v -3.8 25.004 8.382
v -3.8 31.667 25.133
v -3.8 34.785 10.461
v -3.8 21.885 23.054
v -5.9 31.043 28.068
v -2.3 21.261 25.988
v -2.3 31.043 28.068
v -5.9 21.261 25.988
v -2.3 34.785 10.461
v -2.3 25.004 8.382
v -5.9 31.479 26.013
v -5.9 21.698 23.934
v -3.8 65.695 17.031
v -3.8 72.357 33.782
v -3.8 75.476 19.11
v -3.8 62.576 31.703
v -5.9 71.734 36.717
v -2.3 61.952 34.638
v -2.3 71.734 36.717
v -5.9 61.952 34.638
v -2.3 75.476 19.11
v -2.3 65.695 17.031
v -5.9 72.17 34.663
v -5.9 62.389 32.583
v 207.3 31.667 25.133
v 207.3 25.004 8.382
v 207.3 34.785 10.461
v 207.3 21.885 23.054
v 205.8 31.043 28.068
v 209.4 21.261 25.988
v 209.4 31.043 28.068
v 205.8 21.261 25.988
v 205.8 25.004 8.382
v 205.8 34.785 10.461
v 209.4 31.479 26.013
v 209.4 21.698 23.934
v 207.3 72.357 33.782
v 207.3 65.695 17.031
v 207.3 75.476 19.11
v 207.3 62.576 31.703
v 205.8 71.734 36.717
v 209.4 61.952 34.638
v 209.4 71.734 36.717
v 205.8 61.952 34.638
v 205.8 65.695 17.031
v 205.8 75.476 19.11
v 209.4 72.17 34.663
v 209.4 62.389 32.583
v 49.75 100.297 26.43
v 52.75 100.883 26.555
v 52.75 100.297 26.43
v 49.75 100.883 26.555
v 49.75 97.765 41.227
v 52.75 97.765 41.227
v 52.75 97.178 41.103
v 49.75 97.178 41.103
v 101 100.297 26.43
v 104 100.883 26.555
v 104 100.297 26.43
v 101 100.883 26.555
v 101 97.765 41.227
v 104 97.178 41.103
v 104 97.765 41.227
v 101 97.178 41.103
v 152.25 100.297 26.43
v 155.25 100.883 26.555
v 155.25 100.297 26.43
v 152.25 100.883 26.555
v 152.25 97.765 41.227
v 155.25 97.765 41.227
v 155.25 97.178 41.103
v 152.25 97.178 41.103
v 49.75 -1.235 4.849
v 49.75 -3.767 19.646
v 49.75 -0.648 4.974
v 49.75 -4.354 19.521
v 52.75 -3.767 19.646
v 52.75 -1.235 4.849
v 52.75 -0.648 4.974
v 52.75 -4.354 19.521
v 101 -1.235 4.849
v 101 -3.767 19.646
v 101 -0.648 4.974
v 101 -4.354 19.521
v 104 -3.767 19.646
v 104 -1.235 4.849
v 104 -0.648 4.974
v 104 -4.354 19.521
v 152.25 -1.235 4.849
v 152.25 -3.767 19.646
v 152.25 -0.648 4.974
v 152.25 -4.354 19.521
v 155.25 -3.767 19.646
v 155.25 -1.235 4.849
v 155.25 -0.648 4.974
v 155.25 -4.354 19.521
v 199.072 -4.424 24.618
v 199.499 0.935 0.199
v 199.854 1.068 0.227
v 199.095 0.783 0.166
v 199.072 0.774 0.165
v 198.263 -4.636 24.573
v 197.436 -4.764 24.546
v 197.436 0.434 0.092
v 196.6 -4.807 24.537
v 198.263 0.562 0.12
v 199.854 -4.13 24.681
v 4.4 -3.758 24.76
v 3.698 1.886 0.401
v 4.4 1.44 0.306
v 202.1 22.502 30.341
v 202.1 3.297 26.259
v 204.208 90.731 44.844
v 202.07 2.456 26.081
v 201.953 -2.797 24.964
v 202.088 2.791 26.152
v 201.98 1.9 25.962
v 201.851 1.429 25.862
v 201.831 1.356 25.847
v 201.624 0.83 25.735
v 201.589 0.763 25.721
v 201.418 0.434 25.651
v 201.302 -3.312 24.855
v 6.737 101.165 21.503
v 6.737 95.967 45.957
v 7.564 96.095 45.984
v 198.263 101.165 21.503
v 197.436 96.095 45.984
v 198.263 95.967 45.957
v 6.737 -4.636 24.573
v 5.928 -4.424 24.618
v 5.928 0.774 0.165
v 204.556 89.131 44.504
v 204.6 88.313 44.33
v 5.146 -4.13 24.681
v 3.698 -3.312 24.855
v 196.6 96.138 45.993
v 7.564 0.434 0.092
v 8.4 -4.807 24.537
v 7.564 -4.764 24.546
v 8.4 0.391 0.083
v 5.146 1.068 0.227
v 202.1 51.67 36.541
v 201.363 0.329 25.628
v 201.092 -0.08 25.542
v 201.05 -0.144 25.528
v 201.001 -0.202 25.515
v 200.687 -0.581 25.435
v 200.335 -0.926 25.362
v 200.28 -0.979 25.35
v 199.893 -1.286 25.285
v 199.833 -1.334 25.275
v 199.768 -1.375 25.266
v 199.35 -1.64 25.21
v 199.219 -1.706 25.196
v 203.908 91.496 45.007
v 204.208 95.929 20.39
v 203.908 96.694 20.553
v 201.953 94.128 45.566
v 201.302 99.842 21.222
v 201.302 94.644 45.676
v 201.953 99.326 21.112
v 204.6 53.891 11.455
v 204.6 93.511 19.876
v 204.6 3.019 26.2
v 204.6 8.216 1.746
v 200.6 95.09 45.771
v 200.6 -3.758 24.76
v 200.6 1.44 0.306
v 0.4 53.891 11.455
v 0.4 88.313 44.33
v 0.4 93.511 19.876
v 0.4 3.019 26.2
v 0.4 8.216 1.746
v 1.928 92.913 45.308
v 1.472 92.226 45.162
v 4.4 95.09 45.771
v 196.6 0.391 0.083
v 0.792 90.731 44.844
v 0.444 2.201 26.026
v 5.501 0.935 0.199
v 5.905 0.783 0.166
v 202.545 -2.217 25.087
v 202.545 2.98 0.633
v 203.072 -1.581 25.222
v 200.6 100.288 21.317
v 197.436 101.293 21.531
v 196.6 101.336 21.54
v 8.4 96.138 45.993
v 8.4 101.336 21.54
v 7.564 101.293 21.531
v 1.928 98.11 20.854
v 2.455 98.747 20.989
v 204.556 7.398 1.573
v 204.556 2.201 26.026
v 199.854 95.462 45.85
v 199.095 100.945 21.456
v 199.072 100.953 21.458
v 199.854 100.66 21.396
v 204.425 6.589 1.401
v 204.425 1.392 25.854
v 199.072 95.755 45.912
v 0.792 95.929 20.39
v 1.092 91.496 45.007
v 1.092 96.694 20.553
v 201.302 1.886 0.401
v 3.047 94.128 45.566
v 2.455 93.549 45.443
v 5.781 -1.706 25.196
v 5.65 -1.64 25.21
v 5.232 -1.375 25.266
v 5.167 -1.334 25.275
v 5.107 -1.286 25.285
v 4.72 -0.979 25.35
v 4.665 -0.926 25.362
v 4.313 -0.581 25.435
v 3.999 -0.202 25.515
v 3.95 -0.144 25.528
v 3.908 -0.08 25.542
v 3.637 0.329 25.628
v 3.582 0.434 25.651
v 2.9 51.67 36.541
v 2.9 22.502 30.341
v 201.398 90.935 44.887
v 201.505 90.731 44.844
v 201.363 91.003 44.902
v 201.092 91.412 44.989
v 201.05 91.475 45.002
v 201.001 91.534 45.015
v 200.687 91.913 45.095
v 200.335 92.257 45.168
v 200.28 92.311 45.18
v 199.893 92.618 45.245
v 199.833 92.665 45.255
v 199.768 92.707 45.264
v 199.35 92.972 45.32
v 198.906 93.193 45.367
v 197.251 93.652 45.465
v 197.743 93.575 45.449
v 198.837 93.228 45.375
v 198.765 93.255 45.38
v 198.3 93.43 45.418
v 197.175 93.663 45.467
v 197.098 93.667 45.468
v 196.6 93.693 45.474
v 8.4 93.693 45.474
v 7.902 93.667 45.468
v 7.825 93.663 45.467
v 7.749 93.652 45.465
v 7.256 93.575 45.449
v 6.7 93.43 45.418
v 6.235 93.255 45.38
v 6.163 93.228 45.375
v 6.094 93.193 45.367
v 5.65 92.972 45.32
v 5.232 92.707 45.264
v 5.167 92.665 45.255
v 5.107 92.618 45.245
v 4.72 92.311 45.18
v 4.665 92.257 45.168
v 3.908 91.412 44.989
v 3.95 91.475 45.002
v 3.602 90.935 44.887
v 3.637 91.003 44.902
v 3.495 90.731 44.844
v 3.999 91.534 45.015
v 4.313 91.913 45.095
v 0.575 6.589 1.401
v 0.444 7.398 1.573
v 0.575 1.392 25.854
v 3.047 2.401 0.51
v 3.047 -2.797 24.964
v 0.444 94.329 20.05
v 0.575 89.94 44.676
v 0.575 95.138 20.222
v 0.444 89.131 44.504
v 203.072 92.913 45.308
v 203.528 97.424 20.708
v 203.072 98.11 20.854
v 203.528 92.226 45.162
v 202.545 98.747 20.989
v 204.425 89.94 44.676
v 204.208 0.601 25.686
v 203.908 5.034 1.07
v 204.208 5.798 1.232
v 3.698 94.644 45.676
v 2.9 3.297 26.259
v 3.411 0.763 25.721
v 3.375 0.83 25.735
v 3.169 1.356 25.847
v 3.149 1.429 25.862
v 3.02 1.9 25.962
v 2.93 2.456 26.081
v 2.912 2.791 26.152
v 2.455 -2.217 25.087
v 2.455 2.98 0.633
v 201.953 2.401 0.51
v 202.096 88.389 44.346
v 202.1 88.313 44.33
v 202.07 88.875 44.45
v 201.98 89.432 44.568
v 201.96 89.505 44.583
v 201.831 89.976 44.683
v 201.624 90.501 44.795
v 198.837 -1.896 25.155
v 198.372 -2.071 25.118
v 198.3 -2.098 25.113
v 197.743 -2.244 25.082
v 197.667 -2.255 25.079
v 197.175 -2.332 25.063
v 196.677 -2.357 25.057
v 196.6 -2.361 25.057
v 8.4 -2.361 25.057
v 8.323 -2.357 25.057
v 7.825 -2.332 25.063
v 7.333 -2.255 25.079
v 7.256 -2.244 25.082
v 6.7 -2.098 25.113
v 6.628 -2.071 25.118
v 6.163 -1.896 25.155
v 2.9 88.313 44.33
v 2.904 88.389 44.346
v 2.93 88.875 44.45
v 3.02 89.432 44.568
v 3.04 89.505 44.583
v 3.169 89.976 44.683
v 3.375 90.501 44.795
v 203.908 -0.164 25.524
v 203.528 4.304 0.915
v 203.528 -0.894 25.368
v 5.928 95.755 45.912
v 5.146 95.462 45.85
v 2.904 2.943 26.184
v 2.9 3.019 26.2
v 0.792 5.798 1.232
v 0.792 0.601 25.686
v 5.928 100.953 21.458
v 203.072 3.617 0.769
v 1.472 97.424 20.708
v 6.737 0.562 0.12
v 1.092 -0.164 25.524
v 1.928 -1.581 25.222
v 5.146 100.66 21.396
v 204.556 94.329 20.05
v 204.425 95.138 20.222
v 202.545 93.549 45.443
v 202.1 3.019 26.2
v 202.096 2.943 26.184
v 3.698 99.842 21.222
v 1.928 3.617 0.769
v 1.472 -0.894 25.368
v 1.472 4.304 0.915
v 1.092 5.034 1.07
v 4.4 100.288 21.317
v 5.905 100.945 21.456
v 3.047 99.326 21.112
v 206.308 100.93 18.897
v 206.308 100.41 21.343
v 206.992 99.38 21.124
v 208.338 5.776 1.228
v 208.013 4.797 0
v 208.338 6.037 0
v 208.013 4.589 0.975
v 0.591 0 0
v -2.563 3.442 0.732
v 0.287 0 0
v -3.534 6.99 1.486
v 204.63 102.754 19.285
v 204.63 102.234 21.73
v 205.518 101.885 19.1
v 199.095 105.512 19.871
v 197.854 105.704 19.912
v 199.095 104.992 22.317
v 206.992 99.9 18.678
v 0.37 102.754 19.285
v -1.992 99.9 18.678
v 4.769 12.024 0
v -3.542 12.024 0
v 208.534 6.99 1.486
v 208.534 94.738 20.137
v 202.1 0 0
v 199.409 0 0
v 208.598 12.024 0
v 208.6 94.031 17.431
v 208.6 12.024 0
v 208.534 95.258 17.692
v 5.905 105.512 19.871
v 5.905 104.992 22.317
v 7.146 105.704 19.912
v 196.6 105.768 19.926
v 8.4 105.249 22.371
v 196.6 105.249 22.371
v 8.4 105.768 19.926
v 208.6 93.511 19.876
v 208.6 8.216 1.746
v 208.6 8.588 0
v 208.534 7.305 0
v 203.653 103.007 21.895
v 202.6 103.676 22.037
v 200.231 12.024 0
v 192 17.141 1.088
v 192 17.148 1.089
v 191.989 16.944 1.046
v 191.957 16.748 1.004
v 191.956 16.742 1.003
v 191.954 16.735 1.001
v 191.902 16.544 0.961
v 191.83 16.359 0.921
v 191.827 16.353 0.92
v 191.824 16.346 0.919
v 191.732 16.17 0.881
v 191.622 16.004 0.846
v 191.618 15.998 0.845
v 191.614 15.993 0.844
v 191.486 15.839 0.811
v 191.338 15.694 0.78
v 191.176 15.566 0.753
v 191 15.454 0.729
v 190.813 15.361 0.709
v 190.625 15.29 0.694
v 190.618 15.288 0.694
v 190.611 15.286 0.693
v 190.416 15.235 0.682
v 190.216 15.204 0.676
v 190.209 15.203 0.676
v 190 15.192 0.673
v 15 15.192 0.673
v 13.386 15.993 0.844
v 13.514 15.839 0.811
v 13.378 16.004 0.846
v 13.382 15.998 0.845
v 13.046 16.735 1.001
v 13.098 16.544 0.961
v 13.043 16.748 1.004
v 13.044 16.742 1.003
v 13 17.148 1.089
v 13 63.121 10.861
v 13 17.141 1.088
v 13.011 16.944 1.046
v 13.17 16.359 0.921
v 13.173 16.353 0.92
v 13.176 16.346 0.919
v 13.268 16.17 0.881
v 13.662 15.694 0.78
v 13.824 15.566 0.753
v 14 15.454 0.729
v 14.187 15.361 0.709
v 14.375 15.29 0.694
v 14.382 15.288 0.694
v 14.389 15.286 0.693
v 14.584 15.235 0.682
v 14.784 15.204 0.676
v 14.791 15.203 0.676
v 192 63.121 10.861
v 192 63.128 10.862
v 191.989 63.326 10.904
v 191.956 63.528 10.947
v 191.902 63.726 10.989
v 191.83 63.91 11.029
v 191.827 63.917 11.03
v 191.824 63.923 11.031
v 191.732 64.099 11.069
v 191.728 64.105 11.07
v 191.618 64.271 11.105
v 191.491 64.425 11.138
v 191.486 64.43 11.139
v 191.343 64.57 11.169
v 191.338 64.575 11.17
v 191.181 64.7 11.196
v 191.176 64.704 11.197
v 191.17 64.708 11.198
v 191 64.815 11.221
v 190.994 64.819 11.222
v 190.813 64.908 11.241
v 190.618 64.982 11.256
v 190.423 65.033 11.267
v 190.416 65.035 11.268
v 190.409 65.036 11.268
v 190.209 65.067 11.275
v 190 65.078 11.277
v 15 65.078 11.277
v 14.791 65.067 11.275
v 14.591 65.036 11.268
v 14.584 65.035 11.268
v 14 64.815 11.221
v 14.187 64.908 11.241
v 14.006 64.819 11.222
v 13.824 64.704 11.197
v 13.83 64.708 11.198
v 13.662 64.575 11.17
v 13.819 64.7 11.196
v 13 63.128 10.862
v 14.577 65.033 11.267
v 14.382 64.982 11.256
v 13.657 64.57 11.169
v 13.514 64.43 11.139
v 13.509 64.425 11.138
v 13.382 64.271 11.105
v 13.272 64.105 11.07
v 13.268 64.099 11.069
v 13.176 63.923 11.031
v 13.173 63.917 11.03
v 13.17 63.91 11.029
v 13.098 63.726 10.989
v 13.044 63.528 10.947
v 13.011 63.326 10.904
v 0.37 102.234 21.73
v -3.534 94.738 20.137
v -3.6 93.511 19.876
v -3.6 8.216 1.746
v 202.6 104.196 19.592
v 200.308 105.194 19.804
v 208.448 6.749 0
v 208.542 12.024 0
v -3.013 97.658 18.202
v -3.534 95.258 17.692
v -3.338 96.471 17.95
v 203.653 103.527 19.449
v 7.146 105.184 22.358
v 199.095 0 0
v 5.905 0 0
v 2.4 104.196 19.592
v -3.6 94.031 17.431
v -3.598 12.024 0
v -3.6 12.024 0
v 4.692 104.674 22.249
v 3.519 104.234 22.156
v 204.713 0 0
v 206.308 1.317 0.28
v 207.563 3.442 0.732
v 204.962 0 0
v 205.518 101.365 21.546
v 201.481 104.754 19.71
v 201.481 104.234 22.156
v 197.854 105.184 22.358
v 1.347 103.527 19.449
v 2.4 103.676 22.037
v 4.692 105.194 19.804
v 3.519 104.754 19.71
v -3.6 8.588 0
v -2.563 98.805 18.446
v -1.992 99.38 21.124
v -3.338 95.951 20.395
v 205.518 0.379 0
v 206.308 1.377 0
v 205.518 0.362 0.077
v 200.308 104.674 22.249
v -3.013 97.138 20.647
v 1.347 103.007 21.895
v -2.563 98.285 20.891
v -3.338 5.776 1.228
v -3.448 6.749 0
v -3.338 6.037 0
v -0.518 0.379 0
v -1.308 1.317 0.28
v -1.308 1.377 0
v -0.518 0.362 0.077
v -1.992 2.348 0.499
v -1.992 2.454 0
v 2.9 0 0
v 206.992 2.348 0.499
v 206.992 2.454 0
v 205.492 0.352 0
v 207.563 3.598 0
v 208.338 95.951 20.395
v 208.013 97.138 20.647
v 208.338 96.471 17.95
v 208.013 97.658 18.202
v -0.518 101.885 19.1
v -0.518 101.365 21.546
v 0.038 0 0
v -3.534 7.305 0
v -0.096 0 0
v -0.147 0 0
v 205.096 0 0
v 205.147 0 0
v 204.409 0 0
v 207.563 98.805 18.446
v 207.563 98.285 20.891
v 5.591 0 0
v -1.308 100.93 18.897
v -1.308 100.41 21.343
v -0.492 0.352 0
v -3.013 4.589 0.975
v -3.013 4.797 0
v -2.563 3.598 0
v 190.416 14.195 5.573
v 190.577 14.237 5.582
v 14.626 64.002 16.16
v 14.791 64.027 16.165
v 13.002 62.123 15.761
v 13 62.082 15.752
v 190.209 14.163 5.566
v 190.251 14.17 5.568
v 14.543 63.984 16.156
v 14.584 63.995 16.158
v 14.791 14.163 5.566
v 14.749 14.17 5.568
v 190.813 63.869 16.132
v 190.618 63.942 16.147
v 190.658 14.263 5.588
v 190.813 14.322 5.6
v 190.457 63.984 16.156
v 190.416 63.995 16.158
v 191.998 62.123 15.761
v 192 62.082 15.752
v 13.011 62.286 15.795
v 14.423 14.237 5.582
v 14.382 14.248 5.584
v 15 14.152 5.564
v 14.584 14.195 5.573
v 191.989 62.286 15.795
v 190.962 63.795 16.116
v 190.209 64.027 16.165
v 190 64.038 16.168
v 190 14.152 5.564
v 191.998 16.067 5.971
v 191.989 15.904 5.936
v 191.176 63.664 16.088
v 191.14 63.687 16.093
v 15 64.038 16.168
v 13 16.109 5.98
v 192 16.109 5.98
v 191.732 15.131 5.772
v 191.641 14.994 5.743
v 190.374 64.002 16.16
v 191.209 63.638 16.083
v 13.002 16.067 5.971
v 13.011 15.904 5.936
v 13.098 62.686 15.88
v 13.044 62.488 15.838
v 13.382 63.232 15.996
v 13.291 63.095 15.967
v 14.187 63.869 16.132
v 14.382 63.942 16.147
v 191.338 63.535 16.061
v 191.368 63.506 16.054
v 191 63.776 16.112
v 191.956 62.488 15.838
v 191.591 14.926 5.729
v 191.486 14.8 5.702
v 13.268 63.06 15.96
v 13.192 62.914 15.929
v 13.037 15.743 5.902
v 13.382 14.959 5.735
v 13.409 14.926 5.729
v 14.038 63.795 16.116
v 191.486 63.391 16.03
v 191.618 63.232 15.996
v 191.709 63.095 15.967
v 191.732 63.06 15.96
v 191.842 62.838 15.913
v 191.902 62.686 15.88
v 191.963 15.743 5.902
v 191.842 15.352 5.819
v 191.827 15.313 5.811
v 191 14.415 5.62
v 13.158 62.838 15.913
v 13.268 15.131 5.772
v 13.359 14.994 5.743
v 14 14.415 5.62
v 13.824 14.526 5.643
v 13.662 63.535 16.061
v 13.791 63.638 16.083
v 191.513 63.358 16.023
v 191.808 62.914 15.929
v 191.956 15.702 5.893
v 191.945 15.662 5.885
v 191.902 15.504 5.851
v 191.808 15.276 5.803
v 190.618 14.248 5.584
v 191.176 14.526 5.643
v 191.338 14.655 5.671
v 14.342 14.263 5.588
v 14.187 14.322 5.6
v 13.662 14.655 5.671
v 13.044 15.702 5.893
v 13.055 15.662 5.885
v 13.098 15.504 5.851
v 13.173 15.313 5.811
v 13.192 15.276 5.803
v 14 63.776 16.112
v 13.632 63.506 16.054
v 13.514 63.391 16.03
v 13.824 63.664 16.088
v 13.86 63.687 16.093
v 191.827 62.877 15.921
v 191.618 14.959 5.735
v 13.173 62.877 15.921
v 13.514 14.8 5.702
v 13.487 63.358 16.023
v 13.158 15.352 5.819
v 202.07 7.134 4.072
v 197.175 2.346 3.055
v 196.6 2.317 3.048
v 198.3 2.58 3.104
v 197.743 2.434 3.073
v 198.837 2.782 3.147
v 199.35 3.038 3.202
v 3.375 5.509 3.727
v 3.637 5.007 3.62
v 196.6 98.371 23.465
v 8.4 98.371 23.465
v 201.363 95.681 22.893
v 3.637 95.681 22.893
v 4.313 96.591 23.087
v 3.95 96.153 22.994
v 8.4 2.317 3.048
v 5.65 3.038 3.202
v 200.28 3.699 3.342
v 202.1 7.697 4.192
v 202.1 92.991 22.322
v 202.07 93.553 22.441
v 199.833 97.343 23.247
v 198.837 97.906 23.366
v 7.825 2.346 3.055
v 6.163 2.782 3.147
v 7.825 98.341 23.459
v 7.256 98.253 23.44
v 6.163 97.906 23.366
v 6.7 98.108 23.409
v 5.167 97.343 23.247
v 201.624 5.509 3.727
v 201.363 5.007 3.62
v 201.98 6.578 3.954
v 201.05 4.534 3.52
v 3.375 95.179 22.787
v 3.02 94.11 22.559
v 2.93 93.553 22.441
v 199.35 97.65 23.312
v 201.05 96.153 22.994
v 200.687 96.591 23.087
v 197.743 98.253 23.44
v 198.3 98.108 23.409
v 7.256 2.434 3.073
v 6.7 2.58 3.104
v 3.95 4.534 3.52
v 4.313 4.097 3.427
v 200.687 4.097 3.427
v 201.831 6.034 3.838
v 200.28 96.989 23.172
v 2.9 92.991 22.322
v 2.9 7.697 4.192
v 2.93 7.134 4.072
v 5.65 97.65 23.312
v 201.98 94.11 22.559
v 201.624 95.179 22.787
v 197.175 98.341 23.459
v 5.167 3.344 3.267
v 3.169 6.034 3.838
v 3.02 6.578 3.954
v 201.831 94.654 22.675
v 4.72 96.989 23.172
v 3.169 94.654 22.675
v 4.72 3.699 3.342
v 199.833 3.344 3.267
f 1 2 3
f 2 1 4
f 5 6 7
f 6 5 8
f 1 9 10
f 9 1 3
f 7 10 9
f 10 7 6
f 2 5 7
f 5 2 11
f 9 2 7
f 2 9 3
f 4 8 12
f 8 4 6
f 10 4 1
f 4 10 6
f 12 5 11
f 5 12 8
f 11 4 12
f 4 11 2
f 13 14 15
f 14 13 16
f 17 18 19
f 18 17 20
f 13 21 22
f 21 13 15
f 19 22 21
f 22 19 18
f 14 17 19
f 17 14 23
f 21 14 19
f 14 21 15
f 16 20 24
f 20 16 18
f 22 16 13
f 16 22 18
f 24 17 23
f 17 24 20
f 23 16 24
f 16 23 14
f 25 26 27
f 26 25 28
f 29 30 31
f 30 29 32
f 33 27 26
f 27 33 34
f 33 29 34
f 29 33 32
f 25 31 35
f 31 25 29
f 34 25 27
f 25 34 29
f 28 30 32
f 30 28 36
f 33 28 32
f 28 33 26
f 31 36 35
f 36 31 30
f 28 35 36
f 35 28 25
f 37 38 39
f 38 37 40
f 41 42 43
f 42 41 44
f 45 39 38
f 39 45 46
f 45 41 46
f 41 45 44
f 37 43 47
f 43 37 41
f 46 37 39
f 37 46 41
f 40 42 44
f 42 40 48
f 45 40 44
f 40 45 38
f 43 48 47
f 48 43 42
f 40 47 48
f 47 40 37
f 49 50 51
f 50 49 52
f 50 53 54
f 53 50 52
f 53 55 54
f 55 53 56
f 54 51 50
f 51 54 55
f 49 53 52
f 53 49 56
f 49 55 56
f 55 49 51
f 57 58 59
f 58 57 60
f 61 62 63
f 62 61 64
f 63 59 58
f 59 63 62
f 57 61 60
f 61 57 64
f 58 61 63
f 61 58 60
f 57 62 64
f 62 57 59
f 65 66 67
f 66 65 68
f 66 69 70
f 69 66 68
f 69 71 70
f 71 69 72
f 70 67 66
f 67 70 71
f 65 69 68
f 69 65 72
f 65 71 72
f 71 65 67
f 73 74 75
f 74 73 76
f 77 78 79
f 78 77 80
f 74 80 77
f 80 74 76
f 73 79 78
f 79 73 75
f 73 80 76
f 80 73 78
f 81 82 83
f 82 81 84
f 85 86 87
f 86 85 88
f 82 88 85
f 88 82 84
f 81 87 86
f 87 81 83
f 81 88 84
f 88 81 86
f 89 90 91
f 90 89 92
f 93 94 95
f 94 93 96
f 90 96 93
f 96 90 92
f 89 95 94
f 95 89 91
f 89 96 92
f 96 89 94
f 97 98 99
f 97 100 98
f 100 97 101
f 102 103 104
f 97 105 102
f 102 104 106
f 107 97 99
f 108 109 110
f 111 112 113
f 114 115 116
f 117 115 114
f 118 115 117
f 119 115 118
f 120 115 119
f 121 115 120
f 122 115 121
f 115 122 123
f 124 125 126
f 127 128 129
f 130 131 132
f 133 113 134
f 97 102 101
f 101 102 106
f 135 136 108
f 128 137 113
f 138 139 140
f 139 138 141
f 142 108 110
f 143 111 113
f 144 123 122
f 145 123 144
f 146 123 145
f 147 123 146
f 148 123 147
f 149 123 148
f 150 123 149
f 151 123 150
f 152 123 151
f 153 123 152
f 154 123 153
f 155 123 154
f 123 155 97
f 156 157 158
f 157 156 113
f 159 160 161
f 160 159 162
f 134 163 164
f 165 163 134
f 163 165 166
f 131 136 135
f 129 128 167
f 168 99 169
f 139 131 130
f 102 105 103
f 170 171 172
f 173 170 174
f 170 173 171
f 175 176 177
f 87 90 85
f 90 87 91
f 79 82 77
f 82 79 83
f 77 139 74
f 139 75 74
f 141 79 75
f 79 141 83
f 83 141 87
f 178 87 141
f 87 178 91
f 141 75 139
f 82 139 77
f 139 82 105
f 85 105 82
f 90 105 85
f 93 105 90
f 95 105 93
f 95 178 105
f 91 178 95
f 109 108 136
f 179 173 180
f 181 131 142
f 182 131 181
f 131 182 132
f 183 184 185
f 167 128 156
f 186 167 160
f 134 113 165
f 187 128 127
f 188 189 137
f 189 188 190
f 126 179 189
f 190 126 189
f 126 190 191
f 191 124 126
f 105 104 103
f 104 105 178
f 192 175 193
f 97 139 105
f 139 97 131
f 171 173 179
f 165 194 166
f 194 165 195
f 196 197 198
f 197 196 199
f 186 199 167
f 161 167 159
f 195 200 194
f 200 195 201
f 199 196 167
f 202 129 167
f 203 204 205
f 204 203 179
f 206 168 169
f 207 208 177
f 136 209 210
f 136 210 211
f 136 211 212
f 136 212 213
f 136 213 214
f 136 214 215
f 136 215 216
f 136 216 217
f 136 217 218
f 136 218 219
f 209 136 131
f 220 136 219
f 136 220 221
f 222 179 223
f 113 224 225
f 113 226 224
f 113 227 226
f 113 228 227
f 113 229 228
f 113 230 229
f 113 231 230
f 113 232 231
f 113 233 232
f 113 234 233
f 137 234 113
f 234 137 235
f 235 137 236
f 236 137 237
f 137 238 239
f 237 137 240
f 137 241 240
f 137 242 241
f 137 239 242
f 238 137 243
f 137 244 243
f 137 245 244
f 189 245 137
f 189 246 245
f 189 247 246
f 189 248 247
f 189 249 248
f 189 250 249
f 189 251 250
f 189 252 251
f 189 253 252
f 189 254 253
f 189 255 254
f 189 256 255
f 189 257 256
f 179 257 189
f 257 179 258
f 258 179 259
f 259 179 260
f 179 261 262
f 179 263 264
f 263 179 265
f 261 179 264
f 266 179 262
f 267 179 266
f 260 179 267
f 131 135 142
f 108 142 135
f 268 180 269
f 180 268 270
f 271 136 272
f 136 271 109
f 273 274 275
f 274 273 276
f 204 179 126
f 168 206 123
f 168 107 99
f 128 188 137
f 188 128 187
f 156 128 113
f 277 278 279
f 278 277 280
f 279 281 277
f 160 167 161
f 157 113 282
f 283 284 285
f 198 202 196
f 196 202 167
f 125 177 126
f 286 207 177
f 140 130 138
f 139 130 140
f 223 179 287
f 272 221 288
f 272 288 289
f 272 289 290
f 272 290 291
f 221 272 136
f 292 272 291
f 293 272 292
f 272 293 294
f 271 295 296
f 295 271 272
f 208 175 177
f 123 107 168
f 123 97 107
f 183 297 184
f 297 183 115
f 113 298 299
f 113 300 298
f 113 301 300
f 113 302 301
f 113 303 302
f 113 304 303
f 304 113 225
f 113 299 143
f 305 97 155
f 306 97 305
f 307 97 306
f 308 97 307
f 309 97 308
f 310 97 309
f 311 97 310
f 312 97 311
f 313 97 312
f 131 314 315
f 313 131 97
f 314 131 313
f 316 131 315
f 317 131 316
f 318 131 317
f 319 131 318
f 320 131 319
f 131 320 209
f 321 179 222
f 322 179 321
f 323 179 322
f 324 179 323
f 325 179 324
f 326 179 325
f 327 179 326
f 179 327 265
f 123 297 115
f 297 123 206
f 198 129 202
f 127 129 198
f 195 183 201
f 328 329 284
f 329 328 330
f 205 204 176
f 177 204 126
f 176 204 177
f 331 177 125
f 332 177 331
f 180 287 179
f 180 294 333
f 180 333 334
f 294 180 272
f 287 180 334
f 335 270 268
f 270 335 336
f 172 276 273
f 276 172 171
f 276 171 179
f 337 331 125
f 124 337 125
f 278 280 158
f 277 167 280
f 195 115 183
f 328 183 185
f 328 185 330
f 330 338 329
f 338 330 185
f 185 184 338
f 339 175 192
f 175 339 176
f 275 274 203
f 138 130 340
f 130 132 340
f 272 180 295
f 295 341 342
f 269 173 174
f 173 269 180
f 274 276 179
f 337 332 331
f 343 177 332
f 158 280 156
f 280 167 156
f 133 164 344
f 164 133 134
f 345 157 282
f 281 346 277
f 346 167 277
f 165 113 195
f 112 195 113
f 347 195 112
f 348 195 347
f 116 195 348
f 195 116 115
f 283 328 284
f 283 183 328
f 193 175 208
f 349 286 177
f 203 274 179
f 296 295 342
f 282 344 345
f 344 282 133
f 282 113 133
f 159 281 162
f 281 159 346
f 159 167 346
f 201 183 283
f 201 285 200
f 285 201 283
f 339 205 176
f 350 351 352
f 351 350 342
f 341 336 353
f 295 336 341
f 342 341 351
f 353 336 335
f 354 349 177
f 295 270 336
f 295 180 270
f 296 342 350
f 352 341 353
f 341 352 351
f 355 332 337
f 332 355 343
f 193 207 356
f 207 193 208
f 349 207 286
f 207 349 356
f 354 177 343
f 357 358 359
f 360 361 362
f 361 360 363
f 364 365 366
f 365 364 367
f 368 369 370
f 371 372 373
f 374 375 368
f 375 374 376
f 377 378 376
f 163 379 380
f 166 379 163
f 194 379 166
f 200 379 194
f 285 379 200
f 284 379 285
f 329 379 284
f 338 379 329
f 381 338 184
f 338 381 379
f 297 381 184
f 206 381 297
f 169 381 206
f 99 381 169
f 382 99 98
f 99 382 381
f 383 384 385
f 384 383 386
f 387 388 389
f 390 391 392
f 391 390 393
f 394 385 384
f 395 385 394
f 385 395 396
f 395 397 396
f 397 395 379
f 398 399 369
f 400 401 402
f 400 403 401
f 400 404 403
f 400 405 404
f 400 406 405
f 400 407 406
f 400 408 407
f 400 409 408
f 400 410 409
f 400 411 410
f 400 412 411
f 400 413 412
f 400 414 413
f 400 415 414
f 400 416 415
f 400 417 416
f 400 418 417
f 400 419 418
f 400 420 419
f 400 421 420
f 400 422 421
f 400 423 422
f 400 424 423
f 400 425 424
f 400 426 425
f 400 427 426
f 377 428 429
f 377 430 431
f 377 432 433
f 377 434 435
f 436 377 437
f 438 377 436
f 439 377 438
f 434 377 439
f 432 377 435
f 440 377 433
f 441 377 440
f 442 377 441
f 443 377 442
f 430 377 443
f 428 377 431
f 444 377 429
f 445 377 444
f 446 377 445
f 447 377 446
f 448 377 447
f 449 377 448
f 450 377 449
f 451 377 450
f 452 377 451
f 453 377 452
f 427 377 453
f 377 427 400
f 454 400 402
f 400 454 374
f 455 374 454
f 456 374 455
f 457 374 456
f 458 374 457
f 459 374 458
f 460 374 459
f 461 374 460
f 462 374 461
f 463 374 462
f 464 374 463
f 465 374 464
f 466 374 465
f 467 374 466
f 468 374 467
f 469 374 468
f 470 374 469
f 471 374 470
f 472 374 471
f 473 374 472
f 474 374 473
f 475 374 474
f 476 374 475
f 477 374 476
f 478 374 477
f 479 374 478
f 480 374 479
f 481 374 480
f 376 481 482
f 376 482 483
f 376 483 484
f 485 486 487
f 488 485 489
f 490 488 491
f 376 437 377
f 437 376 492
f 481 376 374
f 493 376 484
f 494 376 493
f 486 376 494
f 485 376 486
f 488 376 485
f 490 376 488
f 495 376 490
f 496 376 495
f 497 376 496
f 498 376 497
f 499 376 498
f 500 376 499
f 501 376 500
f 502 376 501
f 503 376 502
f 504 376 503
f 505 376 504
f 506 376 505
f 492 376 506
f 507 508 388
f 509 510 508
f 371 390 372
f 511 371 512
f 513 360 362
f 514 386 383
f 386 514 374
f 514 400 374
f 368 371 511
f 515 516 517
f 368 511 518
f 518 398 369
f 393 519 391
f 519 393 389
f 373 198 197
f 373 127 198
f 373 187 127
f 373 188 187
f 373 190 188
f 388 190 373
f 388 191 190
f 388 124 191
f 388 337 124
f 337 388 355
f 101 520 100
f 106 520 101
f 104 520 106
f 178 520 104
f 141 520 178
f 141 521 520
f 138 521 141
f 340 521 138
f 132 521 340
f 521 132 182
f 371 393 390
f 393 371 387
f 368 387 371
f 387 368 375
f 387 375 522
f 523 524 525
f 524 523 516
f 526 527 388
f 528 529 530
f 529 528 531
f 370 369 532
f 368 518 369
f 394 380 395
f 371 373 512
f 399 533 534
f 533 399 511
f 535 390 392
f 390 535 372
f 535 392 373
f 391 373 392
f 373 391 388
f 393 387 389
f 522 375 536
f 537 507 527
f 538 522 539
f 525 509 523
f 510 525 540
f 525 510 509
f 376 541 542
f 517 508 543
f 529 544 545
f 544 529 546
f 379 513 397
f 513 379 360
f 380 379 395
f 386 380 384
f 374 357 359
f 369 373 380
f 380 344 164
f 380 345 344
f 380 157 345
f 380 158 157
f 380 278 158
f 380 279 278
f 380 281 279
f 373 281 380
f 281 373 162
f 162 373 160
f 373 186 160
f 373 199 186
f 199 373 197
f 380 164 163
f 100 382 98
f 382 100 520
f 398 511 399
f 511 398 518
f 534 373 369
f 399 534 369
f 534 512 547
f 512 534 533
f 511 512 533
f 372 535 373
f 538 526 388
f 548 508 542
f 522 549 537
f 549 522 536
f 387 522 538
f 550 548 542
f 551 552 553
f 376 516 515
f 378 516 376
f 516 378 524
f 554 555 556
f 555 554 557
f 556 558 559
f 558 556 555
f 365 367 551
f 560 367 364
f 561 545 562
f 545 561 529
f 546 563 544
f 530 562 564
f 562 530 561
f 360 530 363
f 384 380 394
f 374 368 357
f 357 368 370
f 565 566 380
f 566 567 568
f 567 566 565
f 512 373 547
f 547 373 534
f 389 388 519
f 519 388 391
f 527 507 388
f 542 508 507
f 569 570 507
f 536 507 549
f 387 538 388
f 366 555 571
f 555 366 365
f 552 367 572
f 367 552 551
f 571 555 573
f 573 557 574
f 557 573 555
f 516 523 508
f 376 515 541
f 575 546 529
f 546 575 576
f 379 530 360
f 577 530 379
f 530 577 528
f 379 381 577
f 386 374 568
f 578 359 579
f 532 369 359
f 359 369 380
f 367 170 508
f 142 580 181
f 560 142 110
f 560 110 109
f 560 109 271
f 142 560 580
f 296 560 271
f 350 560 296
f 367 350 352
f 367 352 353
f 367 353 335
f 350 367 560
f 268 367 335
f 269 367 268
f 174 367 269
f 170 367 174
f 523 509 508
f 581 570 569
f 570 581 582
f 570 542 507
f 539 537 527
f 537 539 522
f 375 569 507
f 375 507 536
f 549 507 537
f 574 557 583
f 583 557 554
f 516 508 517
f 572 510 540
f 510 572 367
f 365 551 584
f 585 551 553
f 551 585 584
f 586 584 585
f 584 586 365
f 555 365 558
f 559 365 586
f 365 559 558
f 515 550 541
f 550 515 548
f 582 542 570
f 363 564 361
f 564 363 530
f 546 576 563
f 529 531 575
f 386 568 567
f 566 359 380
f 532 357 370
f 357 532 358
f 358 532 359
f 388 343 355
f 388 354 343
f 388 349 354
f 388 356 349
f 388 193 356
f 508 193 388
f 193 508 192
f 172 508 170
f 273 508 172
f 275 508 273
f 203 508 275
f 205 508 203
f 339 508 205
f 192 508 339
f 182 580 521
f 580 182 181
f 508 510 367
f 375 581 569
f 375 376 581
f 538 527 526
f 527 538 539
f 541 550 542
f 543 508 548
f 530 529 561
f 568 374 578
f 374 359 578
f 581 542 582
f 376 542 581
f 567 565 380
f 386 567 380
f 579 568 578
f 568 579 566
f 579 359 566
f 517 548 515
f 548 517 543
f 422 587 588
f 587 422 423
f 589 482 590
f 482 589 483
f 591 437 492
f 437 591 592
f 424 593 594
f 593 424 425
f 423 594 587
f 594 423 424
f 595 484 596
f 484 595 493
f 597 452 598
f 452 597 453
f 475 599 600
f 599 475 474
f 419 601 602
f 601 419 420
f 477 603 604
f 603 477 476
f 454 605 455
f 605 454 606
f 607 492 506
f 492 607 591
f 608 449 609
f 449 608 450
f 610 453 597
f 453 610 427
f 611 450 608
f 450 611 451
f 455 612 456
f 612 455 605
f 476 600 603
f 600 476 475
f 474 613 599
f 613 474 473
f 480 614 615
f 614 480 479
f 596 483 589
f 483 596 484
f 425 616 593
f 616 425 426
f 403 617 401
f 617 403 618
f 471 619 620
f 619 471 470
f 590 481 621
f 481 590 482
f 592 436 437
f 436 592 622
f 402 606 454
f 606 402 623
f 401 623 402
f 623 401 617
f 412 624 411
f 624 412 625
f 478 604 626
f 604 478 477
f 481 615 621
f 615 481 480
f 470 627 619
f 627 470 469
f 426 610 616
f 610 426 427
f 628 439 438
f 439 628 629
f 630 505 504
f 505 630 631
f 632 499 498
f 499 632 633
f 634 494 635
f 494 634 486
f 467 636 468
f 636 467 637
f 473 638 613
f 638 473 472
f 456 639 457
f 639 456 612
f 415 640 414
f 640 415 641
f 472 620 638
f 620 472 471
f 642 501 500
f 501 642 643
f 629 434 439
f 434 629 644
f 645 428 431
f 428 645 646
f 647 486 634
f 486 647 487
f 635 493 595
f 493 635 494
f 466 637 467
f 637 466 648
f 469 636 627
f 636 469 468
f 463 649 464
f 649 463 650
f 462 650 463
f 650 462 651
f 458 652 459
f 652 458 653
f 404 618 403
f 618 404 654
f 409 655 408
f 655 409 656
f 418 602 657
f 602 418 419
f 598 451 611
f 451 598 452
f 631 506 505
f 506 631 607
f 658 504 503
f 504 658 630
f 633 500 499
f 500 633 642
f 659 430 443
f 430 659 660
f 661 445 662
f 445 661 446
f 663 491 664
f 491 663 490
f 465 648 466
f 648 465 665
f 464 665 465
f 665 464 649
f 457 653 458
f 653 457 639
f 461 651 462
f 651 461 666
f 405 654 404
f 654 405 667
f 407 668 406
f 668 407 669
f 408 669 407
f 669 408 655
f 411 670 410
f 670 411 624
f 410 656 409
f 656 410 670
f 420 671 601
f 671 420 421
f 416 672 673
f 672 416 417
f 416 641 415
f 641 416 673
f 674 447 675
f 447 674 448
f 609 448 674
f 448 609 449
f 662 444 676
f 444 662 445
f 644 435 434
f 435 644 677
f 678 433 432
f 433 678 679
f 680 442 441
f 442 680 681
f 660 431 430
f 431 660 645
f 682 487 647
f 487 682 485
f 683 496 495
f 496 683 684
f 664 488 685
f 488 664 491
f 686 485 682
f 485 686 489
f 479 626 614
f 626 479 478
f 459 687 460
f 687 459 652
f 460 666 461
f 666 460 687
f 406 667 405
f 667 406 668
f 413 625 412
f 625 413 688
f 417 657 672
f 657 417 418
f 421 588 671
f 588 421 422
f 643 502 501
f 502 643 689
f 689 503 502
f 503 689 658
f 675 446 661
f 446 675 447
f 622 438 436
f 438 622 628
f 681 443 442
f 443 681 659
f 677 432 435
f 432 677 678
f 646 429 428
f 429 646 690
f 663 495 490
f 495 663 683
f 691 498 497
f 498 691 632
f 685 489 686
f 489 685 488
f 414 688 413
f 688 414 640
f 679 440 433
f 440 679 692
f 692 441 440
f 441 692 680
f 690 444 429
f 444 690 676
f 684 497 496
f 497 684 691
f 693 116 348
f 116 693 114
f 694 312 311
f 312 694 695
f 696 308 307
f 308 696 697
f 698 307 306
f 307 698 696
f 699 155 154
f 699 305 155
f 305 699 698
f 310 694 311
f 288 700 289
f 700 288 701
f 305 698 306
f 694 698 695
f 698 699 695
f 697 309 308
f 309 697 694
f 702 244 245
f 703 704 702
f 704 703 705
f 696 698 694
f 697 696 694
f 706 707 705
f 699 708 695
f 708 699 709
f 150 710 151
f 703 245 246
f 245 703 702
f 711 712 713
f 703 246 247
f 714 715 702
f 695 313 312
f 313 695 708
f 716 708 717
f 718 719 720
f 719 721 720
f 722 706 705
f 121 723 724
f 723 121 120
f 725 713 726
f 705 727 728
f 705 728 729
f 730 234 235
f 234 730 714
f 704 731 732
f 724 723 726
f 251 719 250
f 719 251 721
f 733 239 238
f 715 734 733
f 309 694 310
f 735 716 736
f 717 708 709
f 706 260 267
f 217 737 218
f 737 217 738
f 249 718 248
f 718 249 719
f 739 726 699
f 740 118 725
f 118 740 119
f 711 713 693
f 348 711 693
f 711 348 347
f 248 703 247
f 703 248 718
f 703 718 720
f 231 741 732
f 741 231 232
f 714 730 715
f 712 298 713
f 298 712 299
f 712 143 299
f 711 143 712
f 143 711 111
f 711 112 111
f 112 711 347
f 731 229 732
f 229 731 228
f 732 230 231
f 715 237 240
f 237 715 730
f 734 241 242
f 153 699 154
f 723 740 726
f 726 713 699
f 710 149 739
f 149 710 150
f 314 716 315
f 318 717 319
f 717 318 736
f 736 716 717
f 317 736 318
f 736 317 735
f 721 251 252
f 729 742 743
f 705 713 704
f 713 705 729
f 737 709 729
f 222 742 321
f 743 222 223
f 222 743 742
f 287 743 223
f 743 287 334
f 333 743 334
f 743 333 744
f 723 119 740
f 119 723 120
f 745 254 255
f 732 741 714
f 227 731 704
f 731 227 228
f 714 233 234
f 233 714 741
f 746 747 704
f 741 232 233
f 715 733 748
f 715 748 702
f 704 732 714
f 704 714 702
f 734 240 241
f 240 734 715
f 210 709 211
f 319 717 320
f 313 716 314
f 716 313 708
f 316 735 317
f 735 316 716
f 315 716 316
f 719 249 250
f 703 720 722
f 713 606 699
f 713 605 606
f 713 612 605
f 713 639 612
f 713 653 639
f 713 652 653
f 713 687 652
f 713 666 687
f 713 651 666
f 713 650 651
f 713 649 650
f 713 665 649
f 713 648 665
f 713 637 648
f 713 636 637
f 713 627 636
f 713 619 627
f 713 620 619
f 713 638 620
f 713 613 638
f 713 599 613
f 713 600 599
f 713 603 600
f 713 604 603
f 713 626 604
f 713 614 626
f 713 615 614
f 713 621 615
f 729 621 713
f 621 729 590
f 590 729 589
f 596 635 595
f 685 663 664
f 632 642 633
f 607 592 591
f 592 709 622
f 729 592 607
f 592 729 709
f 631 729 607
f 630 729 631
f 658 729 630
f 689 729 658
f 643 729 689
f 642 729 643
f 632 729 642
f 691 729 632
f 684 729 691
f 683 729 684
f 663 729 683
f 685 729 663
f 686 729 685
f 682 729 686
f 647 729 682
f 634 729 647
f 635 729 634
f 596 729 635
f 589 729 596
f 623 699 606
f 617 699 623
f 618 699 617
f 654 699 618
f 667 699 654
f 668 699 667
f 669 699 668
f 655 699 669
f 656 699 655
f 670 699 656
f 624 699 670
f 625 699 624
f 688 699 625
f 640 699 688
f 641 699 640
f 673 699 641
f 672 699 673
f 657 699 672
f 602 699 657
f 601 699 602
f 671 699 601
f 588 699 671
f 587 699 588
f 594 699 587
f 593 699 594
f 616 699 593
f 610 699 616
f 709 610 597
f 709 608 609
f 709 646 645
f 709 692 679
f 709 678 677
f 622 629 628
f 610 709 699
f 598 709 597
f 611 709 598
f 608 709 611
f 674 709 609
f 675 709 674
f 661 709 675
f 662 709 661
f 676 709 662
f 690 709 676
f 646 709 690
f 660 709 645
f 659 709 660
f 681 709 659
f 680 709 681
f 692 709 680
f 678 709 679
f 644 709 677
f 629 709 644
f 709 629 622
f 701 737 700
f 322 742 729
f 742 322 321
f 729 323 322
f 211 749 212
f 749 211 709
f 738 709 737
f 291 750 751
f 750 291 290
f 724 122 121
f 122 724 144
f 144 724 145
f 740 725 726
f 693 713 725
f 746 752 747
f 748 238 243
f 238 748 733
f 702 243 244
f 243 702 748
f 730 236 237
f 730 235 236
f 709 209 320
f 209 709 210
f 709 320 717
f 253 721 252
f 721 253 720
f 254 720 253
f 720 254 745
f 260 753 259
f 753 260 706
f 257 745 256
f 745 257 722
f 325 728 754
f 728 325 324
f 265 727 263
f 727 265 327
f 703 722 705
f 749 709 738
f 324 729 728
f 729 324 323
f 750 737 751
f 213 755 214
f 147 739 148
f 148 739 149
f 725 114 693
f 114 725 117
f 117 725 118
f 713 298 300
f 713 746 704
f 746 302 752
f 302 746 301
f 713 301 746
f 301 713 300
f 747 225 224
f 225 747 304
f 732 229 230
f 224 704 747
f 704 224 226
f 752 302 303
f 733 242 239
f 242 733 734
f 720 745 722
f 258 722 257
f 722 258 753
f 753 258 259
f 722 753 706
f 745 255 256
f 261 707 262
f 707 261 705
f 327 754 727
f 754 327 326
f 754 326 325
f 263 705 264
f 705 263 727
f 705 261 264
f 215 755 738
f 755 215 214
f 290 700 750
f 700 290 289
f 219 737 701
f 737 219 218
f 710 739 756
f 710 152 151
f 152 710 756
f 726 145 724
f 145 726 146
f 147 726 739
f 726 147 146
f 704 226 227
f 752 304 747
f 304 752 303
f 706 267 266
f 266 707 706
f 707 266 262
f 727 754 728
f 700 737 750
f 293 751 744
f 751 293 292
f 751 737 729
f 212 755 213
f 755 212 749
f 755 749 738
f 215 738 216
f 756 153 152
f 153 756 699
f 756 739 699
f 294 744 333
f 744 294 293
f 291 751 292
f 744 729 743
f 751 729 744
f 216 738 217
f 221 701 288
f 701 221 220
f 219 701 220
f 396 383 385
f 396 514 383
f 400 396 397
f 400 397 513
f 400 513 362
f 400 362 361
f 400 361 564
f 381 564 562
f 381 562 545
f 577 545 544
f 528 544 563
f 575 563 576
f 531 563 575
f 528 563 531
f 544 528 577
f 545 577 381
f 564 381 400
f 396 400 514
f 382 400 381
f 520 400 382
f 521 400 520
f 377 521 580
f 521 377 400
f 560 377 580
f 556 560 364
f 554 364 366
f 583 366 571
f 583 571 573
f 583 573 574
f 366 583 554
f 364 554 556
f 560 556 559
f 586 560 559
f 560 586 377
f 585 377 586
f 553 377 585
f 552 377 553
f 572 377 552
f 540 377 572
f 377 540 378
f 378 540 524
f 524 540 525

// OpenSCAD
// Prado 2018 Radio Trim v4 — With snap-fit retention clips
// OEM: Eclipse AVN-R8W  → 205.5 × 104mm face (Toyota 200mm wide format)
// New: Sony XAV-AX8500  → 178 × 50mm DIN chassis
//
// Key changes from v3:
// - Added snap-fit retention clips on sides (Toyota-style spring clips)
// - Added top/bottom friction ribs for secure hold
// - Reinforced walls around clip areas
// - Print orientation: front face down (flange on build plate)

// ── Dimensions (mm) ──────────────────────────────────────────

// Outer = The cavity opening inside the gloss black fascia
outer_w = 205;       // slightly under Eclipse 205.5mm for clearance
outer_h = 104;       // Eclipse height

// Inner cutout = Sony DIN chassis
din_w = 179;          // Sony 178mm + 1mm clearance
din_h = 51;           // Sony 50mm + 1mm clearance

// Corner radii (from photo analysis — fascia has rounded corners ~8mm)
outer_r = 8;
din_r = 2;

// DIN cutout position (low in the opening — per photos and measurements)
din_x = (outer_w - din_w) / 2;   // ~13mm centered horizontally
din_y = 15;                        // 15mm from bottom edge

// Depth
depth = 25;           // body goes into the cavity

// Front flange (sits against the gloss fascia surface)
flange_overhang = 4;  // overlap beyond the cavity opening edge
flange_t = 2.5;       // thickness of the lip

// Dash angle (tilt backward — top of dash is further from driver than bottom)
dash_angle = 12;      // degrees from vertical (estimated from side photo)

// Wall thickness
wall = 2.5;

// Tolerances
tol = 0.4;            // clearance on outer dimensions

// ── Snap Clip Parameters ────────────────────────────────────

// Toyota-style spring clips that flex inward during insertion,
// then snap outward to grip behind the metal dash frame edge
clip_w = 10;          // width of each clip tab
clip_t = 1.5;         // thickness of the flexible arm
clip_depth = 18;      // how far back the clip arm extends
clip_hook = 2;        // hook overhang (catches behind dash frame)
clip_hook_h = 3;      // height of the hook barb
clip_gap = 0.8;       // gap between clip arm and body wall (flex room)

// Clip positions: 2 per side, at 1/3 and 2/3 height
clip_y_positions = [outer_h * 0.3, outer_h * 0.7];

// ── Friction Rib Parameters ─────────────────────────────────

// Small raised ribs on top and bottom walls to create friction fit
rib_h = 0.6;          // how far the rib protrudes
rib_w = 3;            // width of each rib
rib_depth = 15;       // length along depth axis
rib_count = 3;        // number of ribs on top and bottom

// ── Modules ──────────────────────────────────────────────────

$fn = 60;

module rounded_rect_2d(w, h, r) {
    offset(r) offset(-r)
        square([w, h]);
}

// ── Snap Clip Module ─────────────────────────────────────────

module snap_clip() {
    // A single clip arm with hook
    // Oriented along +Z (depth), hook pointing outward (+X)
    //
    // The arm is a thin cantilever beam that flexes inward when
    // the trim is pushed into the cavity, then the hook snaps
    // outward behind the metal frame edge.

    union() {
        // Flexible arm (cantilever beam)
        cube([clip_t, clip_w, clip_depth]);

        // Hook barb at the end of the arm
        // Angled entry face for easy insertion, square catch face
        translate([0, 0, clip_depth - clip_hook_h])
        hull() {
            cube([clip_t, clip_w, clip_hook_h]);
            translate([clip_t + clip_hook, 0, clip_hook_h * 0.3])
                cube([0.1, clip_w, clip_hook_h * 0.7]);
        }
    }
}

// ── Main Trim Body ───────────────────────────────────────────

module trim() {
    difference() {
        union() {
            // Body — fits into the dash cavity
            rotate([dash_angle, 0, 0])
            translate([tol, tol, 0])
            linear_extrude(depth)
                rounded_rect_2d(outer_w - tol*2, outer_h - tol*2, outer_r);

            // Front flange — sits on the fascia surface
            rotate([dash_angle, 0, 0])
            translate([-(flange_overhang - tol), -(flange_overhang - tol), -flange_t])
            linear_extrude(flange_t)
                rounded_rect_2d(
                    outer_w + flange_overhang*2 - tol*2,
                    outer_h + flange_overhang*2 - tol*2,
                    outer_r + flange_overhang
                );

            // ── Left side clips ──
            for (y_pos = clip_y_positions) {
                rotate([dash_angle, 0, 0])
                translate([
                    -(clip_t + clip_gap),   // outside left wall
                    y_pos - clip_w/2,
                    3                        // start 3mm back from front
                ])
                mirror([1, 0, 0])           // hook points left (outward)
                snap_clip();
            }

            // ── Right side clips ──
            for (y_pos = clip_y_positions) {
                rotate([dash_angle, 0, 0])
                translate([
                    outer_w + clip_gap,     // outside right wall
                    y_pos - clip_w/2,
                    3
                ])
                snap_clip();
            }

            // ── Top friction ribs ──
            for (i = [0 : rib_count - 1]) {
                rib_x = outer_w * (i + 1) / (rib_count + 1);
                rotate([dash_angle, 0, 0])
                translate([rib_x - rib_w/2, outer_h - tol, 5])
                    cube([rib_w, rib_h, rib_depth]);
            }

            // ── Bottom friction ribs ──
            for (i = [0 : rib_count - 1]) {
                rib_x = outer_w * (i + 1) / (rib_count + 1);
                rotate([dash_angle, 0, 0])
                translate([rib_x - rib_w/2, tol - rib_h, 5])
                    cube([rib_w, rib_h, rib_depth]);
            }
        }

        // DIN cutout — all the way through body + flange
        rotate([dash_angle, 0, 0])
        translate([din_x, din_y, -flange_t - 1])
        linear_extrude(depth + flange_t + 2)
            rounded_rect_2d(din_w, din_h, din_r);

        // Hollow out the body interior (save material, reduce print time)
        // Leave walls of 'wall' thickness on all sides
        // But DON'T hollow where clips attach — reinforce those areas
        rotate([dash_angle, 0, 0])
        translate([wall + tol, wall + tol, wall])
        linear_extrude(depth + 1)
            rounded_rect_2d(outer_w - wall*2 - tol*2, outer_h - wall*2 - tol*2, outer_r - wall);

        // Cut the bottom flat so it sits on the print bed
        translate([-50, -50, -100])
            cube([outer_w + 100, 100, 100]);
    }
}

// ── Build ────────────────────────────────────────────────────

trim();
